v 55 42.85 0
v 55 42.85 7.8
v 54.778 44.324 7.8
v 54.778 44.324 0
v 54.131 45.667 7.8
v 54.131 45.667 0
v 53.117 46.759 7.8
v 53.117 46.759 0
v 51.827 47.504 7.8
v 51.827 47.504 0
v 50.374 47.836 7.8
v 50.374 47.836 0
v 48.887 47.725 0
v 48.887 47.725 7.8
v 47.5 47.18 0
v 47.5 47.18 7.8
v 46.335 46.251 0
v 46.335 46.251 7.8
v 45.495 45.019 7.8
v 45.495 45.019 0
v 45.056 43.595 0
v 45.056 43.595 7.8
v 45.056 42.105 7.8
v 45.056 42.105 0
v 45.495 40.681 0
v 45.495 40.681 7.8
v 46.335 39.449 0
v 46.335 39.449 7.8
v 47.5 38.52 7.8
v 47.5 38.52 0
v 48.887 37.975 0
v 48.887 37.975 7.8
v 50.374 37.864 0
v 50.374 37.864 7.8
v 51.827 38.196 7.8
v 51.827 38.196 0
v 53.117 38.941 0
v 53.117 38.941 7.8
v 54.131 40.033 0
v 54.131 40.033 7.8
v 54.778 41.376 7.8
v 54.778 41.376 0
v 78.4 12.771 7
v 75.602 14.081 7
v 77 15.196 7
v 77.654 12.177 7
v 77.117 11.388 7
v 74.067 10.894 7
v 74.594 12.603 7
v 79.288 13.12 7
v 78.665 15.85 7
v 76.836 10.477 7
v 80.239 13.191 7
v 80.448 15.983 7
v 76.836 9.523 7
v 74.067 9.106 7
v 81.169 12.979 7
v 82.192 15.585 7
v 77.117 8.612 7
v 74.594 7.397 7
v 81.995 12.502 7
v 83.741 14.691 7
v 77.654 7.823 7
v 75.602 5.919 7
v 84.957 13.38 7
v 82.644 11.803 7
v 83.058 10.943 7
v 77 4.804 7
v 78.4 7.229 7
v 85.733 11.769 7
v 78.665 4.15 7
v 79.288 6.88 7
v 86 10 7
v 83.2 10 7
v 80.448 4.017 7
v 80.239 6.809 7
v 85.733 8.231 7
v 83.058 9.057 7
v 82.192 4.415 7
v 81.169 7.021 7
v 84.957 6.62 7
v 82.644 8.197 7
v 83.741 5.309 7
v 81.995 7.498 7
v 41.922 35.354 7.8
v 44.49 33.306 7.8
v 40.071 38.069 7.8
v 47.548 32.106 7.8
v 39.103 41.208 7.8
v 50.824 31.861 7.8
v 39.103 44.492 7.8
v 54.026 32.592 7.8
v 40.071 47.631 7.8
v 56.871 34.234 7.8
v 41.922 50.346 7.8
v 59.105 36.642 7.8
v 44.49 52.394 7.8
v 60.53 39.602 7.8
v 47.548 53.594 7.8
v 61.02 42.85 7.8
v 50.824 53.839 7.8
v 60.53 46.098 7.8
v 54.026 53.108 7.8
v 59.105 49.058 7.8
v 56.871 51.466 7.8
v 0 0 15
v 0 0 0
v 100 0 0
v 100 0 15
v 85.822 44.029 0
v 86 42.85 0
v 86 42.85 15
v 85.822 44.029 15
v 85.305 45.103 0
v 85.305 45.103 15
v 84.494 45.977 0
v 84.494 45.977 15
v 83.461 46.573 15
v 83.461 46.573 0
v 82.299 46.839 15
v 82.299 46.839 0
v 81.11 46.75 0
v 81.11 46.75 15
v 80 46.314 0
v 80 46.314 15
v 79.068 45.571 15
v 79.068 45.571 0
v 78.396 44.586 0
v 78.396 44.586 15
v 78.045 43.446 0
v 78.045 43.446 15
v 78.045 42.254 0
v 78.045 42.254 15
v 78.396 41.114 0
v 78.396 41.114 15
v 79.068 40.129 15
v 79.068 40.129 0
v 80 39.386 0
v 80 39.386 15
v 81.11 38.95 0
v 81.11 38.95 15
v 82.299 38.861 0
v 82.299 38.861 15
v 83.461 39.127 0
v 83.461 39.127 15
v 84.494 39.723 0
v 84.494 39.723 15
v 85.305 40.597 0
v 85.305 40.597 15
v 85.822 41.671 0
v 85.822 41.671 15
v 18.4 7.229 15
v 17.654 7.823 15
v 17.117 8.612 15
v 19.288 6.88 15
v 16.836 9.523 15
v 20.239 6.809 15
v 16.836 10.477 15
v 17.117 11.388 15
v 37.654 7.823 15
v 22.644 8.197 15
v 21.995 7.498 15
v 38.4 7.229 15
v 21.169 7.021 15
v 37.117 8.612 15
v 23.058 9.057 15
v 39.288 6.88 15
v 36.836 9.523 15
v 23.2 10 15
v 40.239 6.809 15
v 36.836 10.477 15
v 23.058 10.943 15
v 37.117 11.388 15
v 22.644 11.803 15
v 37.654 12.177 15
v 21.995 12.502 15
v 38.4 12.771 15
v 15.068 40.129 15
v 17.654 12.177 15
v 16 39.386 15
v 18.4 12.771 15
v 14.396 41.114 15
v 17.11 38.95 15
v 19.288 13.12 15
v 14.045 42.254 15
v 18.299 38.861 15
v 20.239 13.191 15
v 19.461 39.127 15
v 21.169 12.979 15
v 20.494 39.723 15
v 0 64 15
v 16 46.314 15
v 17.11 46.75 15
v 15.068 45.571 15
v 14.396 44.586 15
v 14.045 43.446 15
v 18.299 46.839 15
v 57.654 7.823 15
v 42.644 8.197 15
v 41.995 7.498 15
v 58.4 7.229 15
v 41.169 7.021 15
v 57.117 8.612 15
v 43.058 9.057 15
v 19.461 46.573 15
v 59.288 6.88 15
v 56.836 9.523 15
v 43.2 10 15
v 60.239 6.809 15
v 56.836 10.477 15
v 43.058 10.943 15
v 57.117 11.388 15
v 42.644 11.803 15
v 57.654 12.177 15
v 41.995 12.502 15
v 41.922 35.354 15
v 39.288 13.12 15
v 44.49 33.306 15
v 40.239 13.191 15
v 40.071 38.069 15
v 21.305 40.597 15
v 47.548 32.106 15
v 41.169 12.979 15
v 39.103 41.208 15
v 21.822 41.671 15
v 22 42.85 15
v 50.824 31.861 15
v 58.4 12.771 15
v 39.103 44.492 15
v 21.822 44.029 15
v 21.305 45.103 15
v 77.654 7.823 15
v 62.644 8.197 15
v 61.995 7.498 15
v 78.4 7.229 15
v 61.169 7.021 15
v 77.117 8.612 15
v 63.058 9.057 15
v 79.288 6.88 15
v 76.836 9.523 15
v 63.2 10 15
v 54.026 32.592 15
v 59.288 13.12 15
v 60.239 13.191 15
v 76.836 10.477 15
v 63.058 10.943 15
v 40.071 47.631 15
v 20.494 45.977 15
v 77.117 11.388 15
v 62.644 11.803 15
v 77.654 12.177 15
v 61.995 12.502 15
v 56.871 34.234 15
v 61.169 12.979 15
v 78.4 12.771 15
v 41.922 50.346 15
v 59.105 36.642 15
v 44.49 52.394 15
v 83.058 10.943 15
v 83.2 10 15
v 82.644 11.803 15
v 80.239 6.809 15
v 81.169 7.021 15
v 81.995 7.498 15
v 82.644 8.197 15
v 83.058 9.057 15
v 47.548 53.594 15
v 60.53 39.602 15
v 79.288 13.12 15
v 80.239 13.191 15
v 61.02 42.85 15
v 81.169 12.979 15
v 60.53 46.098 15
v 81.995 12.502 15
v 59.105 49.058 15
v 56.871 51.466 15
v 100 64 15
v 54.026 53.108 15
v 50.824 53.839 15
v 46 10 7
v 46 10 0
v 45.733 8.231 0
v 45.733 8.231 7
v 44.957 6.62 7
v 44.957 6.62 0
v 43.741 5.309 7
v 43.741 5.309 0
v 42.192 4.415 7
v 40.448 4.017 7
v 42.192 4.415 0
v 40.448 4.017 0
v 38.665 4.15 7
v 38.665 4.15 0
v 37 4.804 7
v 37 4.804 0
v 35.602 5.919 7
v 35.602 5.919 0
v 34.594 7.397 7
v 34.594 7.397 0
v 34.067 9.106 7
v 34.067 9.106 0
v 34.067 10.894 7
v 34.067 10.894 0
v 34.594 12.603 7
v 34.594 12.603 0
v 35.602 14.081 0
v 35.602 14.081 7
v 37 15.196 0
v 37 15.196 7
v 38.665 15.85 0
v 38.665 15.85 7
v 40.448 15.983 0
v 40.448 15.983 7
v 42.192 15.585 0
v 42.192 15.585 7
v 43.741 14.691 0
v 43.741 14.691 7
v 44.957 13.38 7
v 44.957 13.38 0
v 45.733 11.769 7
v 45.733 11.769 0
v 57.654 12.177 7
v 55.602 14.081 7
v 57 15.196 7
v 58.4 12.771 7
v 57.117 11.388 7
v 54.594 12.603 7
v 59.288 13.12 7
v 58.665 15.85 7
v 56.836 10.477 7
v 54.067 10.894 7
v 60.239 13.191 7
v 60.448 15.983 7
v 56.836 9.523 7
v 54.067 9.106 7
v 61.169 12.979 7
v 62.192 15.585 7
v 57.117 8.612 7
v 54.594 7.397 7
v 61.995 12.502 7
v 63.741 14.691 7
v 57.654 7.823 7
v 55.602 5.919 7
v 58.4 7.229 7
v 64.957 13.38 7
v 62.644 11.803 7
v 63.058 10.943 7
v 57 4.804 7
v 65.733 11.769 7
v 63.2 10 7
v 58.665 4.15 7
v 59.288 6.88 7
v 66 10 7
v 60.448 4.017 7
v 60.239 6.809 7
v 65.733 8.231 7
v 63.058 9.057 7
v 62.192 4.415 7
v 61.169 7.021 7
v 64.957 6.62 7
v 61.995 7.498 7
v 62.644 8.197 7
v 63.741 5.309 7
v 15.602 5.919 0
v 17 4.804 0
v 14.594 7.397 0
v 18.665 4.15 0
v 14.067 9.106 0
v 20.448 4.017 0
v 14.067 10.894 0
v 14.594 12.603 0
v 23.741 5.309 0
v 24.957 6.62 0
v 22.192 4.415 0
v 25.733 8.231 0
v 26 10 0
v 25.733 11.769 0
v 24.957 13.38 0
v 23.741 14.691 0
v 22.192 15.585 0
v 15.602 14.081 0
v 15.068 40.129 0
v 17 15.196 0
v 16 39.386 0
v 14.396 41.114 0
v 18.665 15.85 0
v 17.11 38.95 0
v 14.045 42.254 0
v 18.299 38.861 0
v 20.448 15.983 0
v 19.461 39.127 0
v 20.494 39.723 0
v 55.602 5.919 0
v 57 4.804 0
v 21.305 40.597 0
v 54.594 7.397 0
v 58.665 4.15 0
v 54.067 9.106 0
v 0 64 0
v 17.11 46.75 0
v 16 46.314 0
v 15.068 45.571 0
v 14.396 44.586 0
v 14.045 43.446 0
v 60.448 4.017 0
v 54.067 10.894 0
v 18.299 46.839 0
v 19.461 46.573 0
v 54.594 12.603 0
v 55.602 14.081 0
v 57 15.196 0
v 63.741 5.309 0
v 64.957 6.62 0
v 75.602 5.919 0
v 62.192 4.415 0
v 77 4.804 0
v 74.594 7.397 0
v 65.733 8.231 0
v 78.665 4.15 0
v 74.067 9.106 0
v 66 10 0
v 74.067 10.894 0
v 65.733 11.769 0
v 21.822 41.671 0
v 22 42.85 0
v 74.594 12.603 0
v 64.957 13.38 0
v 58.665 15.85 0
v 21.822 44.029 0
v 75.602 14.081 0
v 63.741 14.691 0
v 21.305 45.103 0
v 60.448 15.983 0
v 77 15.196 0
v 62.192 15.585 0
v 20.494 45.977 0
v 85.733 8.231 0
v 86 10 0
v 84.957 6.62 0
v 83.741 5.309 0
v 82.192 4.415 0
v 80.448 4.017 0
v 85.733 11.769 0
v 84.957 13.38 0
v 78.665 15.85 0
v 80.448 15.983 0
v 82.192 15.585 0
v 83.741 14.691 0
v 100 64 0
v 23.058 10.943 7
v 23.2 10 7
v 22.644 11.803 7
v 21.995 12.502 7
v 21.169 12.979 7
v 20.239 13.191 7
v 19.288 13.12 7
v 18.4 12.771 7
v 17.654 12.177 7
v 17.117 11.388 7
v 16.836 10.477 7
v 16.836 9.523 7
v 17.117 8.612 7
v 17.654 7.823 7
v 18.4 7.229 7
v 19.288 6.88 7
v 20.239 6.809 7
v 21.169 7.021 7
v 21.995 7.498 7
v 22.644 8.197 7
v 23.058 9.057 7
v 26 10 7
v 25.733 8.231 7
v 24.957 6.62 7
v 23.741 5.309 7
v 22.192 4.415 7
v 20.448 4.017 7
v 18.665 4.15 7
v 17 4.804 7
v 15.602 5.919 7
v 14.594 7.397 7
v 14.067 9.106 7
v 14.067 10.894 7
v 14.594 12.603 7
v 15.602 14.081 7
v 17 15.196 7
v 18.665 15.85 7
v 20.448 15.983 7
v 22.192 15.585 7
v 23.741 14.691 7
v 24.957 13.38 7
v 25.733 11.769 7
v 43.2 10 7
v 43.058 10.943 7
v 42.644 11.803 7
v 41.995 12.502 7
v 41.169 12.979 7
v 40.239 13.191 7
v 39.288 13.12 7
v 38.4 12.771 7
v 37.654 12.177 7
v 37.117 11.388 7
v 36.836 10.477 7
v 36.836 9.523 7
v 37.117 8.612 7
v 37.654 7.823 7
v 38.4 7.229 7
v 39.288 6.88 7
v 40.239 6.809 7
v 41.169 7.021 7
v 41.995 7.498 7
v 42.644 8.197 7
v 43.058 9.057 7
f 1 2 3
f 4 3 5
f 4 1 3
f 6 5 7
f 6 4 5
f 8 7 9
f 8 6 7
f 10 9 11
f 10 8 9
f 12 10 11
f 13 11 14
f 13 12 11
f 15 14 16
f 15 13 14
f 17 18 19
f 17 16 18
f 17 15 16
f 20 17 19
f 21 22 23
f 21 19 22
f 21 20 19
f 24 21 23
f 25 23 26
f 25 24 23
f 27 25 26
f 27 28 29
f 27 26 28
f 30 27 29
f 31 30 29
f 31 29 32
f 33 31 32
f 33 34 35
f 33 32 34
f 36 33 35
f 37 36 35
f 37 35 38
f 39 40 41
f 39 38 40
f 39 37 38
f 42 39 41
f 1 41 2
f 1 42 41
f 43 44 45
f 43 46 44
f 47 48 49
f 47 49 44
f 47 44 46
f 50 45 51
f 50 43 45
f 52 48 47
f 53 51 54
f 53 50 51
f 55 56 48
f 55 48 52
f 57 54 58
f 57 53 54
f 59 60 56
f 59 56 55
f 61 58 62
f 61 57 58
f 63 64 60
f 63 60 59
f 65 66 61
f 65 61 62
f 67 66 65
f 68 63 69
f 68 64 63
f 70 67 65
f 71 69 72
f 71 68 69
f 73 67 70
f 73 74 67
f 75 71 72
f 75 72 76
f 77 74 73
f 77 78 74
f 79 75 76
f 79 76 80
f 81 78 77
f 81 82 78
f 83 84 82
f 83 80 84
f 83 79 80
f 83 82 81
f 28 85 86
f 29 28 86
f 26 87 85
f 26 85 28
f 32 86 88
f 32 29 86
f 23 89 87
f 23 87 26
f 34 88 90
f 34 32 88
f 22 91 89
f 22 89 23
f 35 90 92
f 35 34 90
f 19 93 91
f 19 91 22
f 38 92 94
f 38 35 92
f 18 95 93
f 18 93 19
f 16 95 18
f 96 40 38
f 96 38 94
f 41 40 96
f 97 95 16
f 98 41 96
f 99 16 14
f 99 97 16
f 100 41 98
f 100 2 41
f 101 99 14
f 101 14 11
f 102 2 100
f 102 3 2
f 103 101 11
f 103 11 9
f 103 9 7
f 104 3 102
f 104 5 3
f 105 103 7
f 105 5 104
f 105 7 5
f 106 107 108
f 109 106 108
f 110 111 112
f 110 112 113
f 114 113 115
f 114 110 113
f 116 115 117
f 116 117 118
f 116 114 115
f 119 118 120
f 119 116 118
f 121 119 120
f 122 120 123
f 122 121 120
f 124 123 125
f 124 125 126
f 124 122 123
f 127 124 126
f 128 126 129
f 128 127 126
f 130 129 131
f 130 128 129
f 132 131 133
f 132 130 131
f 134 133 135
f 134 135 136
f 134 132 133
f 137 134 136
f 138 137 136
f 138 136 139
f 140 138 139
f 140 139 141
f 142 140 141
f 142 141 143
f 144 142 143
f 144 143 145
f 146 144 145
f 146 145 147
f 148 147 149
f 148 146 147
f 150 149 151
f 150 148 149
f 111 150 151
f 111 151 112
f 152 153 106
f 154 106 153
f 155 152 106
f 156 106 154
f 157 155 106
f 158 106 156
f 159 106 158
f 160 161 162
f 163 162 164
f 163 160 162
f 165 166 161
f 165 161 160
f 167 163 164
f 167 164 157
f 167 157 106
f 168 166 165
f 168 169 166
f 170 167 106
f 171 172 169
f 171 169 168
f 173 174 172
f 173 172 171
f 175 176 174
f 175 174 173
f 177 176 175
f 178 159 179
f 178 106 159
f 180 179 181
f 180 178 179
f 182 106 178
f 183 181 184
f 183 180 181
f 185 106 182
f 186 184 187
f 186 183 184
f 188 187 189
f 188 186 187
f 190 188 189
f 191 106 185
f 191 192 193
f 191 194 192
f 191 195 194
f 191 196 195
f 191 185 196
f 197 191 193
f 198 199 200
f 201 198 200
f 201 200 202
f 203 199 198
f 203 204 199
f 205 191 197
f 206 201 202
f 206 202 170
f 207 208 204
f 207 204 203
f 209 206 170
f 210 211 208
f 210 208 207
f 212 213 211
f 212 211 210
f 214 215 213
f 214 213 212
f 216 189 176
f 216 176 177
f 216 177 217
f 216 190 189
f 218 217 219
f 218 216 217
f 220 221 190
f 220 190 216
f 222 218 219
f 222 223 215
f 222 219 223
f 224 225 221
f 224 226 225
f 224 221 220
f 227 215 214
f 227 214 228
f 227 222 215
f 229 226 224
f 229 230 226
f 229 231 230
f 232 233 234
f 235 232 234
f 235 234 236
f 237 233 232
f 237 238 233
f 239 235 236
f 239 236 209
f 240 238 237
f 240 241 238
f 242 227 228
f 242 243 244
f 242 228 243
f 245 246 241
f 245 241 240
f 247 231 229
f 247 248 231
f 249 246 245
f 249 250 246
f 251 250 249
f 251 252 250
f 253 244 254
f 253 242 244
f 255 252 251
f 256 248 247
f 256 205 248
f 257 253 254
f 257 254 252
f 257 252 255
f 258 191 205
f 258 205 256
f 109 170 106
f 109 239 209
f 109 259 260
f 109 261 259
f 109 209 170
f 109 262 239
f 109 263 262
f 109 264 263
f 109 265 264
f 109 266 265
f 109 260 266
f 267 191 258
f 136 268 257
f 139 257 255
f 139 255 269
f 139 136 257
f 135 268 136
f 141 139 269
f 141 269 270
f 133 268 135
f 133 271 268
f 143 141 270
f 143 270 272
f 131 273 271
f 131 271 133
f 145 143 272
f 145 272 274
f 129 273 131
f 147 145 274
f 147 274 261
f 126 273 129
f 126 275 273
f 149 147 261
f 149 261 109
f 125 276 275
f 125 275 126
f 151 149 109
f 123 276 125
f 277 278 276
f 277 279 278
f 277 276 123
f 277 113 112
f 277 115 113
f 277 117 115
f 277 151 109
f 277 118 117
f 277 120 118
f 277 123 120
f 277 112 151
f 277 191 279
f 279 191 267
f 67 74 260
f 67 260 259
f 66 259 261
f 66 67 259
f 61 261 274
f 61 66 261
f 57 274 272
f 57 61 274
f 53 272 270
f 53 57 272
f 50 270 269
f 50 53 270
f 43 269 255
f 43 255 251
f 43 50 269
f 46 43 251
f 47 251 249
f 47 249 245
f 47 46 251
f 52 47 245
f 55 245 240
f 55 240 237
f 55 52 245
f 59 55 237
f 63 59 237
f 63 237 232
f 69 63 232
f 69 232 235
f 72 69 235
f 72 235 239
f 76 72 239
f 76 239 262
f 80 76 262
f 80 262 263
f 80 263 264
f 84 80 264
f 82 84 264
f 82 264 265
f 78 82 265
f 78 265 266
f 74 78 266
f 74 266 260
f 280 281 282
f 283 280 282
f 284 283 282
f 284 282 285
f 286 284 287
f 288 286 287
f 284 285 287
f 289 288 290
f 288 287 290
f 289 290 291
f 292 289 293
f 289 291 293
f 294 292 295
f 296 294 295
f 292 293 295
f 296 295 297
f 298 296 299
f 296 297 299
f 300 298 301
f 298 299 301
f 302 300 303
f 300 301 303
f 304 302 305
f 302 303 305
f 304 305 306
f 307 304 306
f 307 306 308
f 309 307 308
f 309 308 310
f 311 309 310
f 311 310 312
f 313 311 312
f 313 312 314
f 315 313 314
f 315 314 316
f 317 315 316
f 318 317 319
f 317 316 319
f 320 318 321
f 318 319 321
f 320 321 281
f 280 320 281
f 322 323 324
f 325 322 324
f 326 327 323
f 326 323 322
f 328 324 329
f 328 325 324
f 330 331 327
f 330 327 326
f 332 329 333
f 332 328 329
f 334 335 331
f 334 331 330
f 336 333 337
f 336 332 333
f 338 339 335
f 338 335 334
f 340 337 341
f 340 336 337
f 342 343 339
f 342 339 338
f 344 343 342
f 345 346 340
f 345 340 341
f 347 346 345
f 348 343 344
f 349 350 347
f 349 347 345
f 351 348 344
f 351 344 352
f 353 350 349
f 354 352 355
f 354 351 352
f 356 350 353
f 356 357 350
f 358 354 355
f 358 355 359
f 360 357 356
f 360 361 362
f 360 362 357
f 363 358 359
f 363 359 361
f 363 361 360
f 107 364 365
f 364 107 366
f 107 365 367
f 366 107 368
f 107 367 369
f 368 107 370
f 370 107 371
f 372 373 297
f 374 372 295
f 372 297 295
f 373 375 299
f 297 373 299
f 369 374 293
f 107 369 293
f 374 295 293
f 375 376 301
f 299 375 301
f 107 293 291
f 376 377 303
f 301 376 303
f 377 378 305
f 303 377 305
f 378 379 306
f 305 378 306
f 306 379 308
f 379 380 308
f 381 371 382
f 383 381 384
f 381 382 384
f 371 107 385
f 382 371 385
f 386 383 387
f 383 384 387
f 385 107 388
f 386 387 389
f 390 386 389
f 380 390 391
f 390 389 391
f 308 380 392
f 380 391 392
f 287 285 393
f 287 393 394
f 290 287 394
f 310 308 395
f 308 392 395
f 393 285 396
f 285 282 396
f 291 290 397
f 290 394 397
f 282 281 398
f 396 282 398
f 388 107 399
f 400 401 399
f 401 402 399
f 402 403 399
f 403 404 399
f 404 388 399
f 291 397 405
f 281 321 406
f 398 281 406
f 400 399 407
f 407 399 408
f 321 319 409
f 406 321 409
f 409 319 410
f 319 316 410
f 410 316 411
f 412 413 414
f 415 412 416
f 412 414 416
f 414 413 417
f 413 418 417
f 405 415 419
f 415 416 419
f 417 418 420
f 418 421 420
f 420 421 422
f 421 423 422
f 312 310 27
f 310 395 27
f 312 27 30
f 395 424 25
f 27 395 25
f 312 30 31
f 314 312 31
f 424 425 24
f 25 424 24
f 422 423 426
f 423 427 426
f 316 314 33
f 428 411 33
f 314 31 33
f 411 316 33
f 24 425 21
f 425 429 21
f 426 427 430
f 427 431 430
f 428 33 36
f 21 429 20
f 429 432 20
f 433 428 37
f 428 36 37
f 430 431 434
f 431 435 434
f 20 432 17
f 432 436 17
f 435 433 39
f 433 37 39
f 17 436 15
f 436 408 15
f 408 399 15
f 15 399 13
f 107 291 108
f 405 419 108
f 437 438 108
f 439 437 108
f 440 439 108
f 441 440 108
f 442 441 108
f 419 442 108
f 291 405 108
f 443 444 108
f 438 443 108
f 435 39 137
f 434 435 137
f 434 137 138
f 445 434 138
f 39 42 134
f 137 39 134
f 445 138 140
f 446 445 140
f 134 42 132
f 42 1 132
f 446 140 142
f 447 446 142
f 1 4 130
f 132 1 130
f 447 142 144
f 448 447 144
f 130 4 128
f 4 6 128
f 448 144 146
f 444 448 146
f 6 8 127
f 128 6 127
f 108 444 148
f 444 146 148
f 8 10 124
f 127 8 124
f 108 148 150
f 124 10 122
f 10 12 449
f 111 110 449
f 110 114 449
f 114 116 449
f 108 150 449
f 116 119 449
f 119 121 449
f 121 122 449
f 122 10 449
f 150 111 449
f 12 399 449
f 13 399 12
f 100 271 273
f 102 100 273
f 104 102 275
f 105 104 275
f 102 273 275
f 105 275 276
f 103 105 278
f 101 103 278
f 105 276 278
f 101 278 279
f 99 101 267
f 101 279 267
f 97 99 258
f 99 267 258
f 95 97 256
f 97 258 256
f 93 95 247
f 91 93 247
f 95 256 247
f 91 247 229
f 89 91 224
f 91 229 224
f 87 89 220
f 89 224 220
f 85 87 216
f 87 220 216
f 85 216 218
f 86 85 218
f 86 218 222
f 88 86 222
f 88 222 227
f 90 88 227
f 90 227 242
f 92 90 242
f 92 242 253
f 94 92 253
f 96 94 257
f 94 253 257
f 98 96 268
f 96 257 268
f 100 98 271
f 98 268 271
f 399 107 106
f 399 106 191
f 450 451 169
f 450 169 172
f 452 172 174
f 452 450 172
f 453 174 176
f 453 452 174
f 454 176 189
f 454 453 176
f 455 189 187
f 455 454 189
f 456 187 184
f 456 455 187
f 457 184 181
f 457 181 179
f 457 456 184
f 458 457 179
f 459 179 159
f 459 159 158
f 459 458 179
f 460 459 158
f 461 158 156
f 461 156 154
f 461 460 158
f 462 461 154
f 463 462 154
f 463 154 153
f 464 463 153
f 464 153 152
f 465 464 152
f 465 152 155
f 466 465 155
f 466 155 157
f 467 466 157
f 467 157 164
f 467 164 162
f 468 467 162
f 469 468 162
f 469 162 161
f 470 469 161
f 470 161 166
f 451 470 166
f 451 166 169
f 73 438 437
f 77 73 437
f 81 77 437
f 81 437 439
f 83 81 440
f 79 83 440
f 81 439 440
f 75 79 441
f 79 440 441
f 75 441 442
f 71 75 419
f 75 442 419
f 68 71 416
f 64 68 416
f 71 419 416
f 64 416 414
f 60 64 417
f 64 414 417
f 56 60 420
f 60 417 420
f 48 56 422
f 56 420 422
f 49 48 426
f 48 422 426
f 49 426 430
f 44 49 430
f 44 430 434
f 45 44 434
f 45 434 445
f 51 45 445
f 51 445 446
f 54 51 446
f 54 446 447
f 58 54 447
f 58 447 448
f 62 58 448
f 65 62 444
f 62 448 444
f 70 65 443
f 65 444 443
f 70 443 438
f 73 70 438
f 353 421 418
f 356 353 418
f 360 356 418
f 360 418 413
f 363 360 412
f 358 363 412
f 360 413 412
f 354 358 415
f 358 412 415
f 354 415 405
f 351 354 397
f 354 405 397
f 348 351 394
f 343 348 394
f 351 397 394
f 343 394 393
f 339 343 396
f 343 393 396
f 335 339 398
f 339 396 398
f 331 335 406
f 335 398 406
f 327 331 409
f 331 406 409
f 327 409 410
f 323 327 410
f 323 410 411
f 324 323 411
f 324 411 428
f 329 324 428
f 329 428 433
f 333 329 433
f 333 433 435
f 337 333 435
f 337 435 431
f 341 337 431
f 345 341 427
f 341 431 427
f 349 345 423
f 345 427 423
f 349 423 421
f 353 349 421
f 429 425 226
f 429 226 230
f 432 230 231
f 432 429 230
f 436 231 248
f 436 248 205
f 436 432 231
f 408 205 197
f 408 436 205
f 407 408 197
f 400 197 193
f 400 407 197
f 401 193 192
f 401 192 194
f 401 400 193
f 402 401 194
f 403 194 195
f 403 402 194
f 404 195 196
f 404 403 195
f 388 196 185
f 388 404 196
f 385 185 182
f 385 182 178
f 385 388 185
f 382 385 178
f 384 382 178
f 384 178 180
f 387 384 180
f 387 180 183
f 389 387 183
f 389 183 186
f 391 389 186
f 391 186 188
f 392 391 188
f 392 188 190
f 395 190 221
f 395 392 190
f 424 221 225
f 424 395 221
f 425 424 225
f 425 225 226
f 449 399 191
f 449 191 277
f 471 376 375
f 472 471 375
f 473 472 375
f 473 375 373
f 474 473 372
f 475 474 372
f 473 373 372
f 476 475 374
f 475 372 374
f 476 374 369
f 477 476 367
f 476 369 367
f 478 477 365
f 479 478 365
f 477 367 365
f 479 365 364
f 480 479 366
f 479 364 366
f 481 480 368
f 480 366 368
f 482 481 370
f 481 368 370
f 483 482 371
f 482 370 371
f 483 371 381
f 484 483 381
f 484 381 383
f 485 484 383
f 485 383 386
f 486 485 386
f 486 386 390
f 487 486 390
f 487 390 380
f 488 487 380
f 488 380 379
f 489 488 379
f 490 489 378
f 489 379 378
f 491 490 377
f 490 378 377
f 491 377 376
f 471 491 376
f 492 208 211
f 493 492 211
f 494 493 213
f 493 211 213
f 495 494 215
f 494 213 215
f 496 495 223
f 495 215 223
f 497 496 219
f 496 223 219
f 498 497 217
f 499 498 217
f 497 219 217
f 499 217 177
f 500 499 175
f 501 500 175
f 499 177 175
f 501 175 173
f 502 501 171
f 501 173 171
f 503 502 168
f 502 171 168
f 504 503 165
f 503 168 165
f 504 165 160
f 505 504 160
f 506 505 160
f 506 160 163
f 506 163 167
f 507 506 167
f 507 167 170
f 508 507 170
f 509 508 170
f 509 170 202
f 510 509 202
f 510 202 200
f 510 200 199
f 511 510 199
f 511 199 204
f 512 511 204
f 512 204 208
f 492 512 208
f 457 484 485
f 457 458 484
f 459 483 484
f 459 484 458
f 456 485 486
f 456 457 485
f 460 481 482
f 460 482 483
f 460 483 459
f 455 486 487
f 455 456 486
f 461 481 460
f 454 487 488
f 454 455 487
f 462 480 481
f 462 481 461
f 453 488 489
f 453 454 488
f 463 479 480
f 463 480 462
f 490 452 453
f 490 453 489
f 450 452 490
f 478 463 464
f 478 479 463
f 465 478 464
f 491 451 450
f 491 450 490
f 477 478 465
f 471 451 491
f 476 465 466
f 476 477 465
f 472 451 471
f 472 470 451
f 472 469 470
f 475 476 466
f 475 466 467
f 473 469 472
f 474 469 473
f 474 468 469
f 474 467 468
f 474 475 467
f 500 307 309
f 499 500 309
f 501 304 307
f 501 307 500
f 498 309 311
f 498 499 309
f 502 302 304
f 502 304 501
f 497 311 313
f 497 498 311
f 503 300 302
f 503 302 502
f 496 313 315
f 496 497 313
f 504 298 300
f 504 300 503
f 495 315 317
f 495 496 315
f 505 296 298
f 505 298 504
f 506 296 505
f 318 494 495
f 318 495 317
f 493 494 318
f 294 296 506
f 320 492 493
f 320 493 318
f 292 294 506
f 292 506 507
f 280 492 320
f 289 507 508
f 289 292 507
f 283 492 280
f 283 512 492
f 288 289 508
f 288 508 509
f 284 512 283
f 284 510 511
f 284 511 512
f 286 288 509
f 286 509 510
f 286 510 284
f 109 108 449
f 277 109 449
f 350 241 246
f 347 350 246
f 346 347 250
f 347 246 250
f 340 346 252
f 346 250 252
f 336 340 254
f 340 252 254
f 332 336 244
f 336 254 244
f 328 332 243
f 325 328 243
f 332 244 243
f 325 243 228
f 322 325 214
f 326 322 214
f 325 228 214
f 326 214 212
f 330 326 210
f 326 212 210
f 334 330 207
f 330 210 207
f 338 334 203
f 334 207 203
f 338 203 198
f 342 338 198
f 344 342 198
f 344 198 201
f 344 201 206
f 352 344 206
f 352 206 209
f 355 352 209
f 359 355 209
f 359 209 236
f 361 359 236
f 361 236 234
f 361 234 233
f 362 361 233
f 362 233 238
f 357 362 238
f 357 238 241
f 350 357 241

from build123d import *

# Parameters (mm, degrees)
SKETCH_W        = 100
SKETCH_H        = 64
SKETCH_R        = 5
SKETCH_R_2      = 3.2
SKETCH_R_3      = 4
PAD_DEPTH       = 15
SKETCH001_R     = 11.02
POCKET_DEPTH    = 7.2
SKETCH002_R     = 6
POCKET001_DEPTH = 7
SKETCH003_R     = 3.2
POCKET002_DEPTH = 15


with BuildPart() as part:
    # Sketch → Pad (new body)
    with BuildSketch(Plane.XY):
        with Locations((50, 32)):
            Rectangle(SKETCH_W, SKETCH_H)
        with Locations((50, 42.85)):
            Circle(SKETCH_R, mode=Mode.SUBTRACT)
        with Locations((20, 10)):
            Circle(SKETCH_R_2, mode=Mode.SUBTRACT)
        with Locations((80, 10)):
            Circle(SKETCH_R_2, mode=Mode.SUBTRACT)
        with Locations((82, 42.85)):
            Circle(SKETCH_R_3, mode=Mode.SUBTRACT)
        with Locations((18, 42.85)):
            Circle(SKETCH_R_3, mode=Mode.SUBTRACT)
    extrude(amount=PAD_DEPTH)

    # Sketch001 (on Face11 of Pad) → Pocket (cut)
    with BuildSketch(Plane.XY.offset(15)):
        with Locations((50, 42.85)):
            Circle(SKETCH001_R)
    extrude(amount=-POCKET_DEPTH, mode=Mode.SUBTRACT)

    # Sketch002 (on Face4 of Pocket) → Pocket001 (cut)
    with BuildSketch(Plane(origin=(0, 0, 0), x_dir=(1, 0, 0), z_dir=(0, 0, -1))):
        with Locations((20, -10)):
            Circle(SKETCH002_R)
        with Locations((80, -10)):
            Circle(SKETCH002_R)
        with Locations((40, -10)):
            Circle(SKETCH002_R)
        with Locations((60, -10)):
            Circle(SKETCH002_R)
    extrude(amount=-POCKET001_DEPTH, mode=Mode.SUBTRACT)

    # Sketch003 (on Face5 of Pocket001) → Pocket002 (cut)
    with BuildSketch(Plane.XY.offset(15)):
        with Locations((40, 10)):
            Circle(SKETCH003_R)
        with Locations((60, 10)):
            Circle(SKETCH003_R)
    extrude(amount=-POCKET002_DEPTH, mode=Mode.SUBTRACT)


solid = part.part
